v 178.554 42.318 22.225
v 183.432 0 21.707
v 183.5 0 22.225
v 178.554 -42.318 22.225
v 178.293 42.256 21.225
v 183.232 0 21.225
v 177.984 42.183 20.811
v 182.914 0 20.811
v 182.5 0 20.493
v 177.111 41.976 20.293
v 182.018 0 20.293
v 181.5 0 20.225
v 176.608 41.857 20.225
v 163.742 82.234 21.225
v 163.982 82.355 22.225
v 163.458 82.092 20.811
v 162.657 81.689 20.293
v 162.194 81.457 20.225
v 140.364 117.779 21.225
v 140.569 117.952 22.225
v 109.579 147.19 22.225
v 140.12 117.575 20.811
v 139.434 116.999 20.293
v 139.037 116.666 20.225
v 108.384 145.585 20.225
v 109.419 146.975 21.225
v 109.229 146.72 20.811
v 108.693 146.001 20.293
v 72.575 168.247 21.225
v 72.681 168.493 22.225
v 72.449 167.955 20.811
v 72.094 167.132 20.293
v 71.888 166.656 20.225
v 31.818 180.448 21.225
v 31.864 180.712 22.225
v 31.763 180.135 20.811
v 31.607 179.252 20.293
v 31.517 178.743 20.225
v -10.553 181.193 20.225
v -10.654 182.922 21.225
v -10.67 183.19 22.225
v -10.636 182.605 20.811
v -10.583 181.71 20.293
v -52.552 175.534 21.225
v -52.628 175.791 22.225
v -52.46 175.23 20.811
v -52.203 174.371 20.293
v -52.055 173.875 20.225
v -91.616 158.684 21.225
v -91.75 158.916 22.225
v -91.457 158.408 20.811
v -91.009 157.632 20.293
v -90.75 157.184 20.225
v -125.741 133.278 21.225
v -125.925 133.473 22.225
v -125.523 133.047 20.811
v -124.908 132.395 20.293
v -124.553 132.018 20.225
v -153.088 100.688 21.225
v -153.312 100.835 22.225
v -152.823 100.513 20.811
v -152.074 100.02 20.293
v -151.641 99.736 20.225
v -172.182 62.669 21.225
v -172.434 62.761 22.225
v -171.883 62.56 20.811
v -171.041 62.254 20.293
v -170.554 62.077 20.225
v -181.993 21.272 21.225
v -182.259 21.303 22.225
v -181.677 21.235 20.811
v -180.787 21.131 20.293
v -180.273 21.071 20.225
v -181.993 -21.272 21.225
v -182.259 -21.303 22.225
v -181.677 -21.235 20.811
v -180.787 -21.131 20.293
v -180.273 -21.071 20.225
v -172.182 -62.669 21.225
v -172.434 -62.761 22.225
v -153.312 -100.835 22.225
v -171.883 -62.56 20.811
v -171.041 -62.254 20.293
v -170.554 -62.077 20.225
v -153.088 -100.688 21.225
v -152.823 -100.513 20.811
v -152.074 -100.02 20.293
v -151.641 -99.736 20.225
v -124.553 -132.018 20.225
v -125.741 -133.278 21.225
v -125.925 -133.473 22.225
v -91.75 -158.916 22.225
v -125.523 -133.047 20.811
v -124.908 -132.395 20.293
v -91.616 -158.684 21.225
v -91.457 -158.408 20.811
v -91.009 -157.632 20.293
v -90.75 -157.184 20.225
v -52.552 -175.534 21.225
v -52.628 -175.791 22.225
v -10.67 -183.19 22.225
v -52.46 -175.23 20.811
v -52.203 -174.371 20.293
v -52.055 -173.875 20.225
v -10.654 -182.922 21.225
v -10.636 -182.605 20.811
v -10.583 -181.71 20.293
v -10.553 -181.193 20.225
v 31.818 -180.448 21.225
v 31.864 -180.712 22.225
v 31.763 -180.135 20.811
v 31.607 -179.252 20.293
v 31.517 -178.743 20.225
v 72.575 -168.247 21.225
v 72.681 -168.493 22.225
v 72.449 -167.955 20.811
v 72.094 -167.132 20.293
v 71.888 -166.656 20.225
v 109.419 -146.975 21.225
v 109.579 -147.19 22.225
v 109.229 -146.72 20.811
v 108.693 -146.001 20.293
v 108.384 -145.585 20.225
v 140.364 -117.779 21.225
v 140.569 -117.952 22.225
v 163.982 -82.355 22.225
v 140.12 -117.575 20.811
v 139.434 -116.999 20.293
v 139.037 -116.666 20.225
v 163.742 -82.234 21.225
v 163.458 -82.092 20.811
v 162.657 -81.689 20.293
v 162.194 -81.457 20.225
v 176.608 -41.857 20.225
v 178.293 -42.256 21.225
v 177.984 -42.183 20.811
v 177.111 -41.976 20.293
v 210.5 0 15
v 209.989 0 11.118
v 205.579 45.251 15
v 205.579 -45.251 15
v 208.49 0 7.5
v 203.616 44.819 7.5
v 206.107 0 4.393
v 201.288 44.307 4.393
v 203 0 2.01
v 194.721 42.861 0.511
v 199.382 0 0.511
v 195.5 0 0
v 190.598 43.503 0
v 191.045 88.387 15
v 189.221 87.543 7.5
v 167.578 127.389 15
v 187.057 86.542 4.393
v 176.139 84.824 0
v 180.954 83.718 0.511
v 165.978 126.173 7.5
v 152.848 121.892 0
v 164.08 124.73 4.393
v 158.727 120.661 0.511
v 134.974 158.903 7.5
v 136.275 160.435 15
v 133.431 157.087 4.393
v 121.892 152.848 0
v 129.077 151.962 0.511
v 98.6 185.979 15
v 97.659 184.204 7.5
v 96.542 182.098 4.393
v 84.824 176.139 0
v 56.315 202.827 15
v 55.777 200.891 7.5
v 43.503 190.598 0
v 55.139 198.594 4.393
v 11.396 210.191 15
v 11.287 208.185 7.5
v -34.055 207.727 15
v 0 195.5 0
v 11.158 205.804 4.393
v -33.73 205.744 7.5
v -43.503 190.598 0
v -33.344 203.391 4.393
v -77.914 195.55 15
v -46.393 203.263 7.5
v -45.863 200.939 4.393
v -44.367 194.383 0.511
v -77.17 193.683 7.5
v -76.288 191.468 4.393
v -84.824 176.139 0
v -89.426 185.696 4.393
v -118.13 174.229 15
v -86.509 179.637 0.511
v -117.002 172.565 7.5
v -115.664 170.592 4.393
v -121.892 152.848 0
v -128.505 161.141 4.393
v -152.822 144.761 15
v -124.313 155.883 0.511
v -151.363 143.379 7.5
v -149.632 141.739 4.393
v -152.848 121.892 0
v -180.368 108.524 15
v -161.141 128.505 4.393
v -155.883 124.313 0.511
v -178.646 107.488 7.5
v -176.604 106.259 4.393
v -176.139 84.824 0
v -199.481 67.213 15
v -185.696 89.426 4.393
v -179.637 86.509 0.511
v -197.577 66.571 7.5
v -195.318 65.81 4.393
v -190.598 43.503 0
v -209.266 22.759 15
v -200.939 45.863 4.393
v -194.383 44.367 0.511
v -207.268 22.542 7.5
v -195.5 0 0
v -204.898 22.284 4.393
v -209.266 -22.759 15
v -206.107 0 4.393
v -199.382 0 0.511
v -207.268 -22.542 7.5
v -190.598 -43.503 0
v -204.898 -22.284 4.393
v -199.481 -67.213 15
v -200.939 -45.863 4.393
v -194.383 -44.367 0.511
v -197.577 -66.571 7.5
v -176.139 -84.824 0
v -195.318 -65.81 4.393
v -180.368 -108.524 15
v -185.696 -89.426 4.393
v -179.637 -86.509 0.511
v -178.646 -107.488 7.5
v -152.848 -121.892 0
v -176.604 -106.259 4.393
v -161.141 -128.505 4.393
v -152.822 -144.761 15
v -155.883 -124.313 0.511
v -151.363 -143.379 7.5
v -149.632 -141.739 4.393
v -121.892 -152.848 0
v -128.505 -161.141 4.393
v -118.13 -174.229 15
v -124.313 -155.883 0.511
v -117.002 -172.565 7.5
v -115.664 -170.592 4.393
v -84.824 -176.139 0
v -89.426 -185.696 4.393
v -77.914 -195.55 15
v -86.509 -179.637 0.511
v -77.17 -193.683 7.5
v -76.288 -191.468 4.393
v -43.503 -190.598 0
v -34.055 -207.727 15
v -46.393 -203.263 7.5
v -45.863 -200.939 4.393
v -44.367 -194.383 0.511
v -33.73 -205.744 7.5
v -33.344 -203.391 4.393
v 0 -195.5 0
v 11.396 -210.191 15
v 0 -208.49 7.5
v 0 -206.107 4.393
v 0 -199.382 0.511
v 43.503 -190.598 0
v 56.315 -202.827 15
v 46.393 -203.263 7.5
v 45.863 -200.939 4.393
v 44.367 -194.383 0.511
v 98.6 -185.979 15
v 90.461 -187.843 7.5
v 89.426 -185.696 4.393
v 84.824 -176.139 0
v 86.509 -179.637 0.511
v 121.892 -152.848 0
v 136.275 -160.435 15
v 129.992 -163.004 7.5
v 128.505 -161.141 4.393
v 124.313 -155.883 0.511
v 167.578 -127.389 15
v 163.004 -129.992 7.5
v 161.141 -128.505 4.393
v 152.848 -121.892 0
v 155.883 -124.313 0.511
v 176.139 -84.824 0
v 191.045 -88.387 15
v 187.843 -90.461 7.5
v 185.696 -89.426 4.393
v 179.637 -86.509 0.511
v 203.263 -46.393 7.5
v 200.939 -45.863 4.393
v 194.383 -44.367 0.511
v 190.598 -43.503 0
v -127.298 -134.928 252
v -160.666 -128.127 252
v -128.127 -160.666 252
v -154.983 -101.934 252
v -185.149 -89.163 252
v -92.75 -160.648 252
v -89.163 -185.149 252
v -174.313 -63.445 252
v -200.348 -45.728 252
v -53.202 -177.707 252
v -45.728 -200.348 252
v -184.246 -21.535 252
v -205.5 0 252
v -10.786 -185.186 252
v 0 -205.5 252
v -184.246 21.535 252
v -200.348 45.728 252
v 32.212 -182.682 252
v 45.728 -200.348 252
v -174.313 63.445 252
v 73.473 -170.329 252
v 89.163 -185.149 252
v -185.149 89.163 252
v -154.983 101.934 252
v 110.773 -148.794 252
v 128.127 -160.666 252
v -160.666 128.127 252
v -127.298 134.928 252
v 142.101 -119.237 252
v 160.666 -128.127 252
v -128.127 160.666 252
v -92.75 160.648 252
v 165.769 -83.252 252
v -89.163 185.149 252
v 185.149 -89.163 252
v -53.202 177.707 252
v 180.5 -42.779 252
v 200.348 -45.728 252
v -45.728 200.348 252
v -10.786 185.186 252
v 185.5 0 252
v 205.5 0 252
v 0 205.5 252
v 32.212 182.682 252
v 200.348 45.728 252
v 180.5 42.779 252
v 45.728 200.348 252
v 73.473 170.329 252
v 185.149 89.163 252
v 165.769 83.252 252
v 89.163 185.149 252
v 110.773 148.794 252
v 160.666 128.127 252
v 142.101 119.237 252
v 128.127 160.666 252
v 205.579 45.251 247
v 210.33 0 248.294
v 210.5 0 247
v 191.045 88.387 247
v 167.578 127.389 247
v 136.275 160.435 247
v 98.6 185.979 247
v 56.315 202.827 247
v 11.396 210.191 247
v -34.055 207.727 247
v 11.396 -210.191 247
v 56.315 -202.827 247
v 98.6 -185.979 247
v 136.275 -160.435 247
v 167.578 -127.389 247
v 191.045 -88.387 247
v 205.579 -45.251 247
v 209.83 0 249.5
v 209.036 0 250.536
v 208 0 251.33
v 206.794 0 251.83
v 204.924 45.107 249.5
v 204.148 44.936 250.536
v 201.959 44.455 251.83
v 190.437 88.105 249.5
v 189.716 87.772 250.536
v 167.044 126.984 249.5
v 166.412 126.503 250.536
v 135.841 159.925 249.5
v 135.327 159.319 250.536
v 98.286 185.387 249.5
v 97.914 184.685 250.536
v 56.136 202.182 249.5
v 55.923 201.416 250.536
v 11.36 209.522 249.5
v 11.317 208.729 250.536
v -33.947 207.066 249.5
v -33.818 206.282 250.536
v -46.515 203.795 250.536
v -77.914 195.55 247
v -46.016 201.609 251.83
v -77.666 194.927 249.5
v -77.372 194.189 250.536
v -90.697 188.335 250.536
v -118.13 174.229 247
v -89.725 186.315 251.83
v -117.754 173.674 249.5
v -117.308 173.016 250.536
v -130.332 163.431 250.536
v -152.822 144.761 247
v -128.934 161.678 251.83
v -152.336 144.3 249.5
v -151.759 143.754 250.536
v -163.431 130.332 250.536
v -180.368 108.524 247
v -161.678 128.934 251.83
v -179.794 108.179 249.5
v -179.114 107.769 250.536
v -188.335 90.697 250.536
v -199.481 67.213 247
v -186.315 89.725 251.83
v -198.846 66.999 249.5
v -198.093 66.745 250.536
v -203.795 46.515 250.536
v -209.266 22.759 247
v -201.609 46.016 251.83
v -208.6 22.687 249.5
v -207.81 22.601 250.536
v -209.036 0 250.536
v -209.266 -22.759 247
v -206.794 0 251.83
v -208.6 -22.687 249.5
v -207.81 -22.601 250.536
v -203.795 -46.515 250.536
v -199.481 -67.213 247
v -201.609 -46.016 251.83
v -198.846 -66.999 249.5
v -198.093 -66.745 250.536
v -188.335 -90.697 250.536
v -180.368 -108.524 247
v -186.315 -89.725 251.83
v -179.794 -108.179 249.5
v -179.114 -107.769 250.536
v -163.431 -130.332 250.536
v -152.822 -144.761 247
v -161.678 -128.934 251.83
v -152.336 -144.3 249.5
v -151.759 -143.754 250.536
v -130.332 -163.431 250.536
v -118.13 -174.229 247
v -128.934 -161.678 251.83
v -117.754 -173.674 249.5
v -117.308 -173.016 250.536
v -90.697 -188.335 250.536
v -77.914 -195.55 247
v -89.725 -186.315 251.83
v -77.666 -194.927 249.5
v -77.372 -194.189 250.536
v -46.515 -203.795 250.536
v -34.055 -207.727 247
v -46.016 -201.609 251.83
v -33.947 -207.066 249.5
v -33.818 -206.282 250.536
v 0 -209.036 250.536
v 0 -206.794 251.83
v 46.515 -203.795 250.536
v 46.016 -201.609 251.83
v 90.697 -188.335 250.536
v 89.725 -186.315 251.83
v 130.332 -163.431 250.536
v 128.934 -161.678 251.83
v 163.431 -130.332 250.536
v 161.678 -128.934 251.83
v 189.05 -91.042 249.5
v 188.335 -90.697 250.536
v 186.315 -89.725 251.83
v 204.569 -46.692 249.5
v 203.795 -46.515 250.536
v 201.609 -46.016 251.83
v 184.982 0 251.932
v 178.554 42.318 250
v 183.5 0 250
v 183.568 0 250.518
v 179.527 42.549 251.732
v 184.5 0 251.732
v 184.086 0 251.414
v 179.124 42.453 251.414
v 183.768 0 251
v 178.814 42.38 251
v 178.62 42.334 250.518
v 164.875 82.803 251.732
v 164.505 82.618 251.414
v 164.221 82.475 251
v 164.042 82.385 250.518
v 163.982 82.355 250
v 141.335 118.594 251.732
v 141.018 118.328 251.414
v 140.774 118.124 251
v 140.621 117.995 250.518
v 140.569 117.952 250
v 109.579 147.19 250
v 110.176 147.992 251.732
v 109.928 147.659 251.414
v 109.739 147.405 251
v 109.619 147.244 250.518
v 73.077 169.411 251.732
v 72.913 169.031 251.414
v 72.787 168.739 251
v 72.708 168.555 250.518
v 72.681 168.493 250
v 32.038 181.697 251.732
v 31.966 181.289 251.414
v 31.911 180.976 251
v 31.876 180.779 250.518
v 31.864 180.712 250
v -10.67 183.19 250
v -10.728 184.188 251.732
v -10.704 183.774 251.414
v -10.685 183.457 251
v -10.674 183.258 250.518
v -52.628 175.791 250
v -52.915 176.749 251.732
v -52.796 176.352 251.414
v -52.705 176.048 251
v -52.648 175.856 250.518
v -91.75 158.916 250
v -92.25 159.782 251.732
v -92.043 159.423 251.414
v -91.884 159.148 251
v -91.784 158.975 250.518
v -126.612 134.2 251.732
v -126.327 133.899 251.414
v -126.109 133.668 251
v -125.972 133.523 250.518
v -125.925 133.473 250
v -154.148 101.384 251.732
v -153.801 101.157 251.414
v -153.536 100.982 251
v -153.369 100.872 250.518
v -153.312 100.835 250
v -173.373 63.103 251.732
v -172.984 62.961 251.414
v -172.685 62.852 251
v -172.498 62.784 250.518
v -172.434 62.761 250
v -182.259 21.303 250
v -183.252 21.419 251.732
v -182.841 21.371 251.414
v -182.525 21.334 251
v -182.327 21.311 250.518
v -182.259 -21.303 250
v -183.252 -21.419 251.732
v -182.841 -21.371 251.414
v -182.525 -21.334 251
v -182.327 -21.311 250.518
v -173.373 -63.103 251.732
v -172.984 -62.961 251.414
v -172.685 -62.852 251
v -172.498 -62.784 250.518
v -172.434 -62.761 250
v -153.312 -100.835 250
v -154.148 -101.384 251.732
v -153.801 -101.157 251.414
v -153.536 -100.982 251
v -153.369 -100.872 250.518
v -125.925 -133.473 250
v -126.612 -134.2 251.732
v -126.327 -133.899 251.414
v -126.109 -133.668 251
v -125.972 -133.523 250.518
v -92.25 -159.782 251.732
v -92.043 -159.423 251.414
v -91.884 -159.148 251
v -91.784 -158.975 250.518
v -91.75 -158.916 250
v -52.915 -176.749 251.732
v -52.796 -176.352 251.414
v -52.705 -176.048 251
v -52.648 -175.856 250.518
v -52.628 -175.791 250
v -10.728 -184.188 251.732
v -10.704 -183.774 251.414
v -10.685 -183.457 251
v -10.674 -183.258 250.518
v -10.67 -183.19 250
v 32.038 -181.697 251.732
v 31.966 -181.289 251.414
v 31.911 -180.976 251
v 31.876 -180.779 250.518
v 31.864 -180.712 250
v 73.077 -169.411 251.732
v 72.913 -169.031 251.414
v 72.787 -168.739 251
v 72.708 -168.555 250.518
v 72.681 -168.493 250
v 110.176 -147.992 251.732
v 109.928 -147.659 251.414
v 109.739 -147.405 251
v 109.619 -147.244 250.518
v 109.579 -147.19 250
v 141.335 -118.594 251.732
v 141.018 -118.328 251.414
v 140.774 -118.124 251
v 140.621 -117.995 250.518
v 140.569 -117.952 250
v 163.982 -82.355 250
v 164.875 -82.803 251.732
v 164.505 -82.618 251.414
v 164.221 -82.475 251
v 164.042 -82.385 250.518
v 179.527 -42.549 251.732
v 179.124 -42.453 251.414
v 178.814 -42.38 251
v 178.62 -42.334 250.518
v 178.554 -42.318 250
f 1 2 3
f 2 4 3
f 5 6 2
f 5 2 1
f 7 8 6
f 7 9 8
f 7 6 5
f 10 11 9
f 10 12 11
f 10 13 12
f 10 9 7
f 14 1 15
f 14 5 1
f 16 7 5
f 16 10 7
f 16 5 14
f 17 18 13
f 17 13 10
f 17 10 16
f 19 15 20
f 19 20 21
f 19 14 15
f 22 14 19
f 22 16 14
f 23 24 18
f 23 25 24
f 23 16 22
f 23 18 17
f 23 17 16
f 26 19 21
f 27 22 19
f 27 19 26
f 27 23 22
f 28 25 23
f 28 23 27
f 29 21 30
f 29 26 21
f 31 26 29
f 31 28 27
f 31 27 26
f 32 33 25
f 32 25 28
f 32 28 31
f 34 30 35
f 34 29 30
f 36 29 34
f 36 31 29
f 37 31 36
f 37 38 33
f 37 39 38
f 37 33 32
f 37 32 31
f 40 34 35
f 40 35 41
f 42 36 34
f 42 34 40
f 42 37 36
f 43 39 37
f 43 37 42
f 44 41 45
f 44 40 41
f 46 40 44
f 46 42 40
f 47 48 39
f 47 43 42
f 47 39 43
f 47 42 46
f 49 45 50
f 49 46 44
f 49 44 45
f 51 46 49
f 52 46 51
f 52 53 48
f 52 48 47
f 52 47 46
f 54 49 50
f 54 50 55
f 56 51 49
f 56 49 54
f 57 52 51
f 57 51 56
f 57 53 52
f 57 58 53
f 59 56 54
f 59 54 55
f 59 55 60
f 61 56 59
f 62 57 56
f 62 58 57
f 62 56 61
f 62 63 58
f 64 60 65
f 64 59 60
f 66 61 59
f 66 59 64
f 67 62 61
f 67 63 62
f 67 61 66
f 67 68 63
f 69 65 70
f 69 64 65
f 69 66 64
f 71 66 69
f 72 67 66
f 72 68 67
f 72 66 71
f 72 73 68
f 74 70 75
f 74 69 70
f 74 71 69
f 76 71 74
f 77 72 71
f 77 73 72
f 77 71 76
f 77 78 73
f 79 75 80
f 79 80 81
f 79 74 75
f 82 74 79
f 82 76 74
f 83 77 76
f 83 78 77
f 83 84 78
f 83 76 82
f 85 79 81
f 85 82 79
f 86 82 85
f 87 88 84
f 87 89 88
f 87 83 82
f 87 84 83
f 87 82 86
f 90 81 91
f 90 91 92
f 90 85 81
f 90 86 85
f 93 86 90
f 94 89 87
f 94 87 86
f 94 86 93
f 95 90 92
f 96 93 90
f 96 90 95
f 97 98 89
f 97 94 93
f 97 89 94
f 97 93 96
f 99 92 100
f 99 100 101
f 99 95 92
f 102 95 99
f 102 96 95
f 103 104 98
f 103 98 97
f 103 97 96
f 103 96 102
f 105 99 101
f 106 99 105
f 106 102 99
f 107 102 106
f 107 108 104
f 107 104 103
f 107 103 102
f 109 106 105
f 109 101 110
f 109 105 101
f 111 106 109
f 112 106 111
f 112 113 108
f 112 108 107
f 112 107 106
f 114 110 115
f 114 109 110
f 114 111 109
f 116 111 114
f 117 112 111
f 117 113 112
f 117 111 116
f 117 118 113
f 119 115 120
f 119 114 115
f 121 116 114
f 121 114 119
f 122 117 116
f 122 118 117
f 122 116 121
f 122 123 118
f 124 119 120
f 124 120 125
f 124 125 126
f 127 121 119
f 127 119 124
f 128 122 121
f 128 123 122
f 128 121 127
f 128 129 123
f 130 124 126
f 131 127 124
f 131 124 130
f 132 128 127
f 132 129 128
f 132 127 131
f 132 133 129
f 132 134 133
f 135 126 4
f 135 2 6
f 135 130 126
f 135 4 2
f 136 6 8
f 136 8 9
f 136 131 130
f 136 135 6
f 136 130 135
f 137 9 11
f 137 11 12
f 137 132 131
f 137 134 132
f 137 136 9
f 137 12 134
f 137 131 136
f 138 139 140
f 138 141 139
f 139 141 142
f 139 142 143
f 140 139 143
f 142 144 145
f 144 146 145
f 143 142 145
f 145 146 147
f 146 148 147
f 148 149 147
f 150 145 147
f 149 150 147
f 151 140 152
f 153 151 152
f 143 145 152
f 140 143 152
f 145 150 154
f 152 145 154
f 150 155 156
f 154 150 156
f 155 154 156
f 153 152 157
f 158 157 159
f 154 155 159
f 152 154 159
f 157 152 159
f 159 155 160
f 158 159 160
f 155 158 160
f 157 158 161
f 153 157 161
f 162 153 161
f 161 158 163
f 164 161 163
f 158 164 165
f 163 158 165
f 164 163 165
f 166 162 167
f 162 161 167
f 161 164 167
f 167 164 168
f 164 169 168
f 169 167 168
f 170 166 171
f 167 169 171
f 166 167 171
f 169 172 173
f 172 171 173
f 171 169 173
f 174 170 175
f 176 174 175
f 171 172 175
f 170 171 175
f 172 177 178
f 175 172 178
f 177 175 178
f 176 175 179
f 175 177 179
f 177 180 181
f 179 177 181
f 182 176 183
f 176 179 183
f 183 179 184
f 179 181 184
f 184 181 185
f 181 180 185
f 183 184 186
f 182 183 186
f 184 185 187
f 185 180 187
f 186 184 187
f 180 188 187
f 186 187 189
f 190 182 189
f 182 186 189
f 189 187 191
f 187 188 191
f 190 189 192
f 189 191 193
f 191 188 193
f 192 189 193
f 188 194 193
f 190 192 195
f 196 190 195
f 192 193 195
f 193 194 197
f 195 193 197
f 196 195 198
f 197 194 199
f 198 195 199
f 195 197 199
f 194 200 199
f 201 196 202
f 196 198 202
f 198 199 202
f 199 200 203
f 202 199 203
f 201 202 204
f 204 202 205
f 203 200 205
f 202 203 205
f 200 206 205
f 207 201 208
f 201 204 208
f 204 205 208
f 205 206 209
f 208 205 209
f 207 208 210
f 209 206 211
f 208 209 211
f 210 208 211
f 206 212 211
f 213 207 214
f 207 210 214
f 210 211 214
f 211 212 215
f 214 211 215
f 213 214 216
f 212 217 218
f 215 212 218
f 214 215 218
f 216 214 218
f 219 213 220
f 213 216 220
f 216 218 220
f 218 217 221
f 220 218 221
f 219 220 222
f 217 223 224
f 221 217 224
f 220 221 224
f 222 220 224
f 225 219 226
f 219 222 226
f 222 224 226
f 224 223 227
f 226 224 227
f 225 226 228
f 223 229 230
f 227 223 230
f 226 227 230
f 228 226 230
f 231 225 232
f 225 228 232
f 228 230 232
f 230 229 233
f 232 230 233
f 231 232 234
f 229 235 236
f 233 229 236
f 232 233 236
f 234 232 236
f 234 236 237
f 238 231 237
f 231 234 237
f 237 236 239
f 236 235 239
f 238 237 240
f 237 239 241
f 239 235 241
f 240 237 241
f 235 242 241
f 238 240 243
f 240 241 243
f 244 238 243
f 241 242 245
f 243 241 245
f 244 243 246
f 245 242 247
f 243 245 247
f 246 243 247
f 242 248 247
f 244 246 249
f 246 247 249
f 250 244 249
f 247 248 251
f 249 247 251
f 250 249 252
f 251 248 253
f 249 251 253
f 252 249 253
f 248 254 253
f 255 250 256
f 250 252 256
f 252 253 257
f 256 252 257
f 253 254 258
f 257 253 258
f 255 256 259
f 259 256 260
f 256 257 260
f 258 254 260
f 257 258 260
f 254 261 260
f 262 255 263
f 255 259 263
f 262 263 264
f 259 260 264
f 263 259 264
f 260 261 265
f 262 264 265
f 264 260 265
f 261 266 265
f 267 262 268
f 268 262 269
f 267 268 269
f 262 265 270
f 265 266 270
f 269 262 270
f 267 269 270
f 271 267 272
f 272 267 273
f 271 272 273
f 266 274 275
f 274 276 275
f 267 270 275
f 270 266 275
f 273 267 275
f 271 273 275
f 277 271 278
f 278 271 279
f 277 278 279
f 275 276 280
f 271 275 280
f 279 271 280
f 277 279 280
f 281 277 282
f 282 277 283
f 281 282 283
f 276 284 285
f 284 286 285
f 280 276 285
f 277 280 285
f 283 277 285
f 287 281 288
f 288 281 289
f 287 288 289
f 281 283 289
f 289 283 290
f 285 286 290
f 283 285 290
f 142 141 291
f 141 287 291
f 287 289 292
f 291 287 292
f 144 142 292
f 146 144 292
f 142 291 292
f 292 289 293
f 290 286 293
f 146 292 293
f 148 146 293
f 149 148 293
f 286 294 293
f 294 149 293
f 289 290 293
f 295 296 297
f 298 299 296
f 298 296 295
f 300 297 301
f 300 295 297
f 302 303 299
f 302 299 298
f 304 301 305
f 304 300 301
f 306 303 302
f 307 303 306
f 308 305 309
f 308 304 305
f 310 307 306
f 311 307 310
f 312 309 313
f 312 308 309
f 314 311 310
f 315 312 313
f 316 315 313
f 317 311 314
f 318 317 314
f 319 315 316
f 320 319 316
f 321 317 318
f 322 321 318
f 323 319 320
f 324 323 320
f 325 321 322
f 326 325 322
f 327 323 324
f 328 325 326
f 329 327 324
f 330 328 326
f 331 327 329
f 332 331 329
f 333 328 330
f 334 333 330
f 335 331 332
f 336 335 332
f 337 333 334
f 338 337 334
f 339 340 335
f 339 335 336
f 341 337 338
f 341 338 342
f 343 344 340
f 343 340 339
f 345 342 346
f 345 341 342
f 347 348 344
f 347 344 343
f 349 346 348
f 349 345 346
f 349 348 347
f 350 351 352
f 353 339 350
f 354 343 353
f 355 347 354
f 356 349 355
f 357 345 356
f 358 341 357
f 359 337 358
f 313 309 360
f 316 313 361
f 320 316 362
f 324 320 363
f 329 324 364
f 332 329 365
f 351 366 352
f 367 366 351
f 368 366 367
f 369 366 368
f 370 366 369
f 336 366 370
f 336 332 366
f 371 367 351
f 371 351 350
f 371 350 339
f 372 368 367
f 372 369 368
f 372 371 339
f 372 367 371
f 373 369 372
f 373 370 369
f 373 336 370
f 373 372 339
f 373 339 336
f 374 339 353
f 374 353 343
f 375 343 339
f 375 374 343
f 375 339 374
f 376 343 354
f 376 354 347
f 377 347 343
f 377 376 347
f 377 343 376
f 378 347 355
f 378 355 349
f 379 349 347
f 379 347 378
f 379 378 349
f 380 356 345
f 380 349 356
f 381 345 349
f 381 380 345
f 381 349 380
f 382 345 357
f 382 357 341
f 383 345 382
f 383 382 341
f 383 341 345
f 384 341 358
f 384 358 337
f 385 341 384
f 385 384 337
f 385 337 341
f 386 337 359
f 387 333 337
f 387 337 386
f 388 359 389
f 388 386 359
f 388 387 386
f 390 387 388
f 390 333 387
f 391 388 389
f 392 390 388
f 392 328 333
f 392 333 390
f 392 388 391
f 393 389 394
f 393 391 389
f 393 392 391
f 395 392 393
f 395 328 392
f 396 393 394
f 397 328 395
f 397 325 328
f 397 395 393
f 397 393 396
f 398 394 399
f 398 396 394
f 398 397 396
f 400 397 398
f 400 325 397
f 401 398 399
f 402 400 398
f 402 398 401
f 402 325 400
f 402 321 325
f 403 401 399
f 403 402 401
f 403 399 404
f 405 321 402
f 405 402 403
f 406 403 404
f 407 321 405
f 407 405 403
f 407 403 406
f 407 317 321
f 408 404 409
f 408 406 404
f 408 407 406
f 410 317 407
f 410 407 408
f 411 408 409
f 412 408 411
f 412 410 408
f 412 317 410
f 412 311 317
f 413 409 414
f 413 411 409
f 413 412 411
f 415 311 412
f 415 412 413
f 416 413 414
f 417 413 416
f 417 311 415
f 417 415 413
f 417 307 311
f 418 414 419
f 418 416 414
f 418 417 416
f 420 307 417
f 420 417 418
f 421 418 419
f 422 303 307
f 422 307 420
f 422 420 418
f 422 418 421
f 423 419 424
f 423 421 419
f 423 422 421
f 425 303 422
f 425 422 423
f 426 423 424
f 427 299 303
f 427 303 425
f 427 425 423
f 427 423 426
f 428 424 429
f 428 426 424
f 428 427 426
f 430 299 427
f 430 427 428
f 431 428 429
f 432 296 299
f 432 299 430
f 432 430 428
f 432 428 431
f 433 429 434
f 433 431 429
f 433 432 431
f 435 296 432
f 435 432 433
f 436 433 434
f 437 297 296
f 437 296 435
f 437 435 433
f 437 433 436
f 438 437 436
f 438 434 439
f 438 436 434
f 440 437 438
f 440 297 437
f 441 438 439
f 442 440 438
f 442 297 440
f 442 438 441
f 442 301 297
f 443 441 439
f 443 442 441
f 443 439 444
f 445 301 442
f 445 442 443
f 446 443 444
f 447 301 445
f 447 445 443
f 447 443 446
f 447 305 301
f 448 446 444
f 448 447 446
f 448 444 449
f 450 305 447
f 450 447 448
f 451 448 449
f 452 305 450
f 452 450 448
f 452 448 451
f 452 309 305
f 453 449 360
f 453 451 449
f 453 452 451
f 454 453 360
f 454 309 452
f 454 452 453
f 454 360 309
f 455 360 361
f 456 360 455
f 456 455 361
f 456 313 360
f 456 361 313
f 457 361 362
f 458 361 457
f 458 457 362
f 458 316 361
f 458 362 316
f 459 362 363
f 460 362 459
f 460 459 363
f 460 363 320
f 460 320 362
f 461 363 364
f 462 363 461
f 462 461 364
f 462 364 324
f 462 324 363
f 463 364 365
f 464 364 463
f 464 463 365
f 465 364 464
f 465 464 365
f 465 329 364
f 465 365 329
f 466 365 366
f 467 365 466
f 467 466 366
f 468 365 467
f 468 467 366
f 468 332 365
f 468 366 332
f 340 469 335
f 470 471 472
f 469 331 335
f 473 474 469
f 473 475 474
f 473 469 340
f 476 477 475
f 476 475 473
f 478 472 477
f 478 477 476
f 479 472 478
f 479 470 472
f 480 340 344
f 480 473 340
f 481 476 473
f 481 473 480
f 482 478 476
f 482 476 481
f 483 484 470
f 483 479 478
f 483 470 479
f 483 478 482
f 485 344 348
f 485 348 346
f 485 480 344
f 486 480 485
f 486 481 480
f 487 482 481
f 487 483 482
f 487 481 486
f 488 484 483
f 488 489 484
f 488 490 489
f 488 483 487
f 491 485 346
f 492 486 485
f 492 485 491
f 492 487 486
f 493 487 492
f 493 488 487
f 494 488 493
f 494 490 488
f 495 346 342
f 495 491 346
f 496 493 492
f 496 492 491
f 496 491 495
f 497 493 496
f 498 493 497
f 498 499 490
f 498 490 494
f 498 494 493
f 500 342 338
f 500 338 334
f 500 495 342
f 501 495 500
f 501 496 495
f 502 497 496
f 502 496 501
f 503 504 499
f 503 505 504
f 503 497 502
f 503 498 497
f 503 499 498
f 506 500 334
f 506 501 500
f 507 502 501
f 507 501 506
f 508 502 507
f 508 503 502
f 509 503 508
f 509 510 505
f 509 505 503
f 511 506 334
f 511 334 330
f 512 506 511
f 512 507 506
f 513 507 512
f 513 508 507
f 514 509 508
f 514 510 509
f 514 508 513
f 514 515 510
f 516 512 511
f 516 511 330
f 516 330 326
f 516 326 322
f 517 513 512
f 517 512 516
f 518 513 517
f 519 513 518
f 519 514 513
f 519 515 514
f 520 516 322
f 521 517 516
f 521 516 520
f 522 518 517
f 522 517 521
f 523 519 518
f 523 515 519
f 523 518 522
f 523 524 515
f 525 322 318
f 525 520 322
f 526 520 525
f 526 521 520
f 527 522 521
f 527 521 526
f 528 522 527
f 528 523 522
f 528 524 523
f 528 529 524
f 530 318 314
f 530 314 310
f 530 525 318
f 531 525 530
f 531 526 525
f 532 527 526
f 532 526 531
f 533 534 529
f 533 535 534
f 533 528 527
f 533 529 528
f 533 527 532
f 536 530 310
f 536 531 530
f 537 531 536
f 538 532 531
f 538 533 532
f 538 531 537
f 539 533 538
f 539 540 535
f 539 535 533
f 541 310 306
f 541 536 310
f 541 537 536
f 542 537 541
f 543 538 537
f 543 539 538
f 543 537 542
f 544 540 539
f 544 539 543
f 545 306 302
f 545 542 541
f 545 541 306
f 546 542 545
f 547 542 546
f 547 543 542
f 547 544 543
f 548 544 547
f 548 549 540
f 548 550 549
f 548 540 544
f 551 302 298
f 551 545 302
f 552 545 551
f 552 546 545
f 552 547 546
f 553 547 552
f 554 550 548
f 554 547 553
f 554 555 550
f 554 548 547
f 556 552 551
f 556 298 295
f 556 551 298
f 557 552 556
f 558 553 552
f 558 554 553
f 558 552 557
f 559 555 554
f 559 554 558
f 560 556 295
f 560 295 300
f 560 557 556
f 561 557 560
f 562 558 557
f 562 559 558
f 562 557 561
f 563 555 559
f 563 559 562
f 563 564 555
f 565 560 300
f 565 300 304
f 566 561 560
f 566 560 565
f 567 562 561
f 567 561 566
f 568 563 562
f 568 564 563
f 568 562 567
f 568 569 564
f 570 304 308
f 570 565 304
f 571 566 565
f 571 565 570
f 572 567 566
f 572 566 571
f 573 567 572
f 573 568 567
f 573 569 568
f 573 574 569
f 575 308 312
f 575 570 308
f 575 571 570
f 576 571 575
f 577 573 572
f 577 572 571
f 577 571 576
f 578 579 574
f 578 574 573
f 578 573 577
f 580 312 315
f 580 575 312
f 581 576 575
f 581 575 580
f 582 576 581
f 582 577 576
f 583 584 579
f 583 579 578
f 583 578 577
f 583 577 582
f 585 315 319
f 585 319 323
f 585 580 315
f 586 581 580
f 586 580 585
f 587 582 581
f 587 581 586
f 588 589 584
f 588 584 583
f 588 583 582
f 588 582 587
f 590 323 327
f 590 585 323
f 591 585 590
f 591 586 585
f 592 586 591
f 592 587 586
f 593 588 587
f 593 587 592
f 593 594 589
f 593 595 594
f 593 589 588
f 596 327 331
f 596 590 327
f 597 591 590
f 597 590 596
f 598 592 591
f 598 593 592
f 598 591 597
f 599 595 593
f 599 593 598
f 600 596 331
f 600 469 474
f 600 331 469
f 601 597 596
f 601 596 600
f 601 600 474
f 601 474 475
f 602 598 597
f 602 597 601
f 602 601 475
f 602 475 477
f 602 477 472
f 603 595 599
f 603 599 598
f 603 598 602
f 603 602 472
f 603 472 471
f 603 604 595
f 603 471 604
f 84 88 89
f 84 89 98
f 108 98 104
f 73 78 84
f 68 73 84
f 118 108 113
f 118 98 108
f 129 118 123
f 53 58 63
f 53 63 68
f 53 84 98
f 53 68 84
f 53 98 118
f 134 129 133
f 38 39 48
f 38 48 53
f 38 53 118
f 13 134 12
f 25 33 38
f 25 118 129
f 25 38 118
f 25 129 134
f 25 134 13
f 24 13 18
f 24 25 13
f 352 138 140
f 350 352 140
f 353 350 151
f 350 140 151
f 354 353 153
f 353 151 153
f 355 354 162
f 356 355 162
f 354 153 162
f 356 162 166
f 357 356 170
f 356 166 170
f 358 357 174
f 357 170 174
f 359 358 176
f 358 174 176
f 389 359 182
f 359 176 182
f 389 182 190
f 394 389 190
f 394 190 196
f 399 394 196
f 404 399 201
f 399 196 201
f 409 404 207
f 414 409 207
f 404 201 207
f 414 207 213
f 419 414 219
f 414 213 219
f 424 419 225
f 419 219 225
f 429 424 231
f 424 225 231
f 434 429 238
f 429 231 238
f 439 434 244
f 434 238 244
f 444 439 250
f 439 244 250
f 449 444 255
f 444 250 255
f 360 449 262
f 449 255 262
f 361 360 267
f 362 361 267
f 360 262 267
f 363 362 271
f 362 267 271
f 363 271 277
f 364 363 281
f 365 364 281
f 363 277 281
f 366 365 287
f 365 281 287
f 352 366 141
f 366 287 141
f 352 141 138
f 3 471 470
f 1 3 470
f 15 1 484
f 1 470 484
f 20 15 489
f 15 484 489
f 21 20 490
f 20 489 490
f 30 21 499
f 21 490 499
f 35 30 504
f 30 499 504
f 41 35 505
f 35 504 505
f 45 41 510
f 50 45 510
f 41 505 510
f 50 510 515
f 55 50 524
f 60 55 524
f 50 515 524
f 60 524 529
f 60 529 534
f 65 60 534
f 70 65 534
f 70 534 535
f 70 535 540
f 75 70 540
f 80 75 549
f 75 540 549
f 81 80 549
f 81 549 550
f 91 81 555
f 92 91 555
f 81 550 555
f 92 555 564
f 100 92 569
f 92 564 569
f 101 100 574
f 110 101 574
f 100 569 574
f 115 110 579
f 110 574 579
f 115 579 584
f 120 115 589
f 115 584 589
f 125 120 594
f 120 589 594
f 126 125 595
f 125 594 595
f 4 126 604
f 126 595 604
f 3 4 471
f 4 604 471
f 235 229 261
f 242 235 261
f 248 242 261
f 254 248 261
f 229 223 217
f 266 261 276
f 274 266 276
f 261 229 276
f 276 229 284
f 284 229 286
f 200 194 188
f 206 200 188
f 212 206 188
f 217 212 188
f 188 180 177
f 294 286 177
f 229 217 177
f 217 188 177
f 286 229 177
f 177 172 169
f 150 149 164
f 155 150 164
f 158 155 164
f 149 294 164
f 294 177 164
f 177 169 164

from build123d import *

# Parameters (mm, degrees)
F0_R     = 210.5
F1_DEPTH = 252
F2_R     = 183.5
F3_DEPTH = 231.775
F4_R     = 15
F5_R     = 5
F6_R     = 2


with BuildPart() as f1:
    # F0 (on Top) → F1 (new body)
    with BuildSketch(Plane.XY):
        Circle(F0_R)
    extrude(amount=F1_DEPTH)

    # F2 (on face) → F3 (cut)
    with BuildSketch(Plane.XY.offset(252)):
        Circle(F2_R)
    extrude(amount=-F3_DEPTH, mode=Mode.SUBTRACT)

    # F4
    f4_edges = [f1.edges().sort_by_distance(p)[0] for p in [
        (-210.5, 0, 0),
    ]]
    fillet(f4_edges, radius=F4_R)

    # F5
    f5_edges = [f1.edges().sort_by_distance(p)[0] for p in [
        (-210.5, 0, 252),
    ]]
    fillet(f5_edges, radius=F5_R)

    # F6
    f6_edges = [f1.edges().sort_by_distance(p)[0] for p in [
        (-183.5, 0, 252),
        (-183.5, 0, 20.225),
    ]]
    fillet(f6_edges, radius=F6_R)


solid = f1.part
